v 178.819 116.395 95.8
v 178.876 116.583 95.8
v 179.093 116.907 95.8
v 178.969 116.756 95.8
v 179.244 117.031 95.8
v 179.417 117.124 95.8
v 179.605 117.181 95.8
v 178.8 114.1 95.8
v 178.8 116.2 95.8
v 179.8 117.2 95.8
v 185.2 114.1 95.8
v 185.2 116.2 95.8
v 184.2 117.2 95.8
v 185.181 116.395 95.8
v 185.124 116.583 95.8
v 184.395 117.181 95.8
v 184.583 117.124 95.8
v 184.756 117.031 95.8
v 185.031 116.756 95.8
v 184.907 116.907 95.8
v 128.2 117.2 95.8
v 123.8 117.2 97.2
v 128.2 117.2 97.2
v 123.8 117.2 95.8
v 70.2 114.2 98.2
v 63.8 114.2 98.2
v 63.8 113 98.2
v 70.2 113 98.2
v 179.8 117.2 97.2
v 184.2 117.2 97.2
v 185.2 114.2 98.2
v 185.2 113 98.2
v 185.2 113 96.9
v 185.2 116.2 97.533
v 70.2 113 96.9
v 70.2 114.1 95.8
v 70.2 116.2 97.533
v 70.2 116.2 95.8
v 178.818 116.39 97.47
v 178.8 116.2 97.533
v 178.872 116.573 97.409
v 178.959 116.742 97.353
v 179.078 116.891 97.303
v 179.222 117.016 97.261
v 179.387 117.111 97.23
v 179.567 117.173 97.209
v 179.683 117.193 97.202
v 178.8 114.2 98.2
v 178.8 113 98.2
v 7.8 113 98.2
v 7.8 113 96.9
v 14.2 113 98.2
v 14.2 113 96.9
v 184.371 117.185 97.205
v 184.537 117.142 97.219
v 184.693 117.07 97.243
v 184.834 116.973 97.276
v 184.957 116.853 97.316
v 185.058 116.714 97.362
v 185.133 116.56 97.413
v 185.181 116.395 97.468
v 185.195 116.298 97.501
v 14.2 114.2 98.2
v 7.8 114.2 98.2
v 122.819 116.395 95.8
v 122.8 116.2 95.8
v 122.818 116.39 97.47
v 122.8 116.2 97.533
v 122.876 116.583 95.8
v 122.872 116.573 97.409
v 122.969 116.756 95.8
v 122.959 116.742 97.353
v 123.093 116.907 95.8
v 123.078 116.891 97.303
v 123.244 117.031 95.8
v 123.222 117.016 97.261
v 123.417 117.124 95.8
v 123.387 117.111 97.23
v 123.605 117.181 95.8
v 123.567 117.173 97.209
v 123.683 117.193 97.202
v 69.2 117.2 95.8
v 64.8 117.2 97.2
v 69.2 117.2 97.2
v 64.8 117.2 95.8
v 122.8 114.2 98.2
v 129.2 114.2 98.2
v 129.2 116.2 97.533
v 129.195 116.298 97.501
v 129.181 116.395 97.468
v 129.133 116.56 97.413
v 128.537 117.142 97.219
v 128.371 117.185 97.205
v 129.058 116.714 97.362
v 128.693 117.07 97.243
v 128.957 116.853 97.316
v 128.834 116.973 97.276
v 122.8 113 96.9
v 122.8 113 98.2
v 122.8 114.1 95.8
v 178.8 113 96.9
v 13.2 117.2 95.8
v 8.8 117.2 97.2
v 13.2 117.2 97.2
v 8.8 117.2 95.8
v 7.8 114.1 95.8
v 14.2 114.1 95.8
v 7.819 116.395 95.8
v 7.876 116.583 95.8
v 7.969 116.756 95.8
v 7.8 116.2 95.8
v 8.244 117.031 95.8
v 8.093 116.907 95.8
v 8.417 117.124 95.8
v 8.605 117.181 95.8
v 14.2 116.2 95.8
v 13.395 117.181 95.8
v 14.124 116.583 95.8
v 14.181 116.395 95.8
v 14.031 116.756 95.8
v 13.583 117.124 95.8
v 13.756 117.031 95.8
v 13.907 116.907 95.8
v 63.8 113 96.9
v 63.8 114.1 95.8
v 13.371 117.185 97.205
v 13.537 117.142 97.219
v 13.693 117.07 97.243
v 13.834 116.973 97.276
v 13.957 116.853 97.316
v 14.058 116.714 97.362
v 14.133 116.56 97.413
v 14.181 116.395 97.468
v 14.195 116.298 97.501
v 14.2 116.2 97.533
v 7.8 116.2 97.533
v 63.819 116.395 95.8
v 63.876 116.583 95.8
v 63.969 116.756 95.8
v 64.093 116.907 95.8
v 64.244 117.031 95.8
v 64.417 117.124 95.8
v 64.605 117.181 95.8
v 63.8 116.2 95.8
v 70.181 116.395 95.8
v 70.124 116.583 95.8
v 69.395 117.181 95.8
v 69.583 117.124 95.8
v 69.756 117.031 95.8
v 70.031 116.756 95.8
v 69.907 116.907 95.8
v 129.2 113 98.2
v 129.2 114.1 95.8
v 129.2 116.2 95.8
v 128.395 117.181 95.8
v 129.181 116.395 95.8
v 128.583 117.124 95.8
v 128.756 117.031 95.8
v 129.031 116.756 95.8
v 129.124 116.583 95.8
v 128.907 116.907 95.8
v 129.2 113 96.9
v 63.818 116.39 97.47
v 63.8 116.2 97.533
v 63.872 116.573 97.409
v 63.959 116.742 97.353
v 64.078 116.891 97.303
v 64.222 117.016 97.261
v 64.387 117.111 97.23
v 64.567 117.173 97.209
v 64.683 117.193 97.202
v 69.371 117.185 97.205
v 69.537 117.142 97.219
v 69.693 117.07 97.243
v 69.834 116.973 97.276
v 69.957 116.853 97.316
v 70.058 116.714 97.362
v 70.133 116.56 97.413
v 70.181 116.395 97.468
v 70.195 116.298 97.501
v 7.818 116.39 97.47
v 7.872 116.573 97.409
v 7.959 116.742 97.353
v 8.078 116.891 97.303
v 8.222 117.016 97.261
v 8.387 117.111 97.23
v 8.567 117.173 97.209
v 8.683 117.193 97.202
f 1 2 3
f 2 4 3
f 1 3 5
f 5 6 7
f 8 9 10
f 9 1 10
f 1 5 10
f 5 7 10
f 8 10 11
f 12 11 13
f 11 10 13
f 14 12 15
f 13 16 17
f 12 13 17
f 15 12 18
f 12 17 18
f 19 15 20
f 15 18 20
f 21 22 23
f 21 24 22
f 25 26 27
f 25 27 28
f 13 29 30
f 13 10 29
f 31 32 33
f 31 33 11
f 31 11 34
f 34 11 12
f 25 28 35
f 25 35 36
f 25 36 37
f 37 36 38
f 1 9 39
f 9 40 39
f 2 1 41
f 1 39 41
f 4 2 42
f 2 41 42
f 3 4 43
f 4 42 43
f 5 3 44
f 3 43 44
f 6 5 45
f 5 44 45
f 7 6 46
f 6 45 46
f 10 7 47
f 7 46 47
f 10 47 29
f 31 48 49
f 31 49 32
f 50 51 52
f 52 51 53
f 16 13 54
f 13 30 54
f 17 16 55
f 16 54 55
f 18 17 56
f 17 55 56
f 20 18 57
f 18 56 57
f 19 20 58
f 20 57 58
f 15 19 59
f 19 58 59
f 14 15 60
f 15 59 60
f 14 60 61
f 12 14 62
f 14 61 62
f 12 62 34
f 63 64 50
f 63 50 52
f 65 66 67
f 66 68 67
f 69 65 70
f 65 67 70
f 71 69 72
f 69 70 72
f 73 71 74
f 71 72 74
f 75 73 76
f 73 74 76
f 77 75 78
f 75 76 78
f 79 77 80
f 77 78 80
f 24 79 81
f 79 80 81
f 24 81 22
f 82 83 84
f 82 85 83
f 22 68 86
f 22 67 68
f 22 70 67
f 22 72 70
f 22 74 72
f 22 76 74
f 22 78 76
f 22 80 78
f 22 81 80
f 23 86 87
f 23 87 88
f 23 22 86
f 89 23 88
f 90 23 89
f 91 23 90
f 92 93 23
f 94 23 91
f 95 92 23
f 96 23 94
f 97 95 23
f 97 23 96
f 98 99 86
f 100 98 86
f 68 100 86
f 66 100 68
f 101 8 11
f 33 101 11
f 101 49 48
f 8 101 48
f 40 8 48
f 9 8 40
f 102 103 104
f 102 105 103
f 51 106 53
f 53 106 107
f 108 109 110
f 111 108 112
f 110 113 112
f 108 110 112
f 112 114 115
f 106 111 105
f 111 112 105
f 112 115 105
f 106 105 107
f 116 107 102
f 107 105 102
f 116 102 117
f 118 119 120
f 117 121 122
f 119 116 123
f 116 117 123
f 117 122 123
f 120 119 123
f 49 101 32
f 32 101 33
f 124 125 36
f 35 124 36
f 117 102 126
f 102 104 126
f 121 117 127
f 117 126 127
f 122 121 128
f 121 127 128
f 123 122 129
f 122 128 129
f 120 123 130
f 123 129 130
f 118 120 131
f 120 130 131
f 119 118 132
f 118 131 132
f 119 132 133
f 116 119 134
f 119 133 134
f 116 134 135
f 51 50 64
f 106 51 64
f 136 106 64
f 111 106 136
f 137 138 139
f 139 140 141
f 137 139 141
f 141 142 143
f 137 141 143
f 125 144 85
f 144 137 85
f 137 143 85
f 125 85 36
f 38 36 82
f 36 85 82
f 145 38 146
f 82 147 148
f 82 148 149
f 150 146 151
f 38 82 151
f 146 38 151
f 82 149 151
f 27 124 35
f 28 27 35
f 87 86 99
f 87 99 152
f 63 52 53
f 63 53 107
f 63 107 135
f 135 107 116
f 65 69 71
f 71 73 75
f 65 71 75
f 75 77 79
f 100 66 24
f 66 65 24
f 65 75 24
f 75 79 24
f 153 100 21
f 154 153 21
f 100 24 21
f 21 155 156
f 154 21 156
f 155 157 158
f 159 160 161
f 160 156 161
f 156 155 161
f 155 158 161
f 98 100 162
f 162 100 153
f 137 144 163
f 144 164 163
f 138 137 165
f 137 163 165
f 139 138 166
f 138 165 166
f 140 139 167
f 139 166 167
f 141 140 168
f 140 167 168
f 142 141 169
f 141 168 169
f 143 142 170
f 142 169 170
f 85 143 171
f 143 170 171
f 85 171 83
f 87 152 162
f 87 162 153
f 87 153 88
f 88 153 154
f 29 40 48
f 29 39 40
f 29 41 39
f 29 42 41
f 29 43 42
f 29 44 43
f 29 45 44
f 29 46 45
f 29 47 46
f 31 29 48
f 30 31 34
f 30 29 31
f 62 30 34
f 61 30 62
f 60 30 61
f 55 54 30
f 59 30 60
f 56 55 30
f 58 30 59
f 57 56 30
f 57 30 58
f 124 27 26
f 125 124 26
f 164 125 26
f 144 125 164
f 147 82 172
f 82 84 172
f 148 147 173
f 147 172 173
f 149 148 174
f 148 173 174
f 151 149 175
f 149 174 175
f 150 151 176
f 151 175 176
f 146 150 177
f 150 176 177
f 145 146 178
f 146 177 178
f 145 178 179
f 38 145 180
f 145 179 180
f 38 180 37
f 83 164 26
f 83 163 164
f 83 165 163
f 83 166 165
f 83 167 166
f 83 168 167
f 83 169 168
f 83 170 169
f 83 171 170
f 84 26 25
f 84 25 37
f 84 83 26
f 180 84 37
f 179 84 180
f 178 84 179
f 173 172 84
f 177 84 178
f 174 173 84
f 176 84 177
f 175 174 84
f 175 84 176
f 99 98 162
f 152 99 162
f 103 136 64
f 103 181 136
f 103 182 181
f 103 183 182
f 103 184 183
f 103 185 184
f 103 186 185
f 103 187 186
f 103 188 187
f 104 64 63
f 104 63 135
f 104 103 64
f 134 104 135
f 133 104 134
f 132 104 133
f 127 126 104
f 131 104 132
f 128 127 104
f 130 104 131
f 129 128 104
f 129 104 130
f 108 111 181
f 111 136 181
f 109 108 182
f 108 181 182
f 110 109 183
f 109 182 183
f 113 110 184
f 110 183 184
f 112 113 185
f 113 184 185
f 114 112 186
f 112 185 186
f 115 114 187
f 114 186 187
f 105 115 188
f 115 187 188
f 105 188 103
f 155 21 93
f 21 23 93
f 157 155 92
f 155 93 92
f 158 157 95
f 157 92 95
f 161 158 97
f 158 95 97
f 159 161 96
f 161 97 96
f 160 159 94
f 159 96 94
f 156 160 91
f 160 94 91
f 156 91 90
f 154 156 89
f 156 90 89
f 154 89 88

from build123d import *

# Parameters (mm, degrees)
BOX085192_W                  = 6.4
BOX085192_H                  = 4.2
BOX085192_DEPTH              = 2.4
CHAMFER011006003017079_SIZE  = 1.1
CHAMFER011006003017078_SIZE2 = 1
CHAMFER011006003017078_SIZE  = 3
BOX085193_W                  = 6.4
BOX085193_H                  = 4.2
BOX085193_DEPTH              = 2.4
CHAMFER011006003017081_SIZE  = 1.1
CHAMFER011006003017080_SIZE2 = 1
CHAMFER011006003017080_SIZE  = 3
BOX085194_W                  = 6.4
BOX085194_H                  = 4.2
BOX085194_DEPTH              = 2.4
CHAMFER011006003017083_SIZE  = 1.1
CHAMFER011006003017082_SIZE2 = 1
CHAMFER011006003017082_SIZE  = 3
BOX085191_W                  = 6.4
BOX085191_H                  = 4.2
BOX085191_DEPTH              = 2.4
CHAMFER011006003017076_SIZE  = 1.1
CHAMFER011006003017077_SIZE2 = 1
CHAMFER011006003017077_SIZE  = 3
FILLET005011017082052_R      = 1


with BuildPart() as chamfer011006003017078:
    # Box085192 → Box085192 (new body)
    with BuildSketch(Plane(origin=(63.8, 113, 95.8), x_dir=(1, 0, 0), z_dir=(0, 0, 1))):
        with Locations((3.2, 2.1)):
            Rectangle(BOX085192_W, BOX085192_H)
    extrude(amount=BOX085192_DEPTH)

    # Chamfer011006003017079
    chamfer011006003017079_edges = [chamfer011006003017078.edges().sort_by_distance(p)[0] for p in [
        (67, 113, 95.8),
    ]]
    chamfer(chamfer011006003017079_edges, length=CHAMFER011006003017079_SIZE)

    # Chamfer011006003017078
    chamfer011006003017078_edges = [chamfer011006003017078.edges().sort_by_distance(p)[0] for p in [
        (67, 117.2, 98.2),
    ]]
    chamfer011006003017078_side = chamfer011006003017078.faces().sort_by_distance((67, 115.1, 98.2))[0]
    chamfer(chamfer011006003017078_edges, length=CHAMFER011006003017078_SIZE, length2=CHAMFER011006003017078_SIZE2, reference=chamfer011006003017078_side)


with BuildPart() as chamfer011006003017080:
    # Box085193 → Box085193 (new body)
    with BuildSketch(Plane(origin=(122.8, 113, 95.8), x_dir=(1, 0, 0), z_dir=(0, 0, 1))):
        with Locations((3.2, 2.1)):
            Rectangle(BOX085193_W, BOX085193_H)
    extrude(amount=BOX085193_DEPTH)

    # Chamfer011006003017081
    chamfer011006003017081_edges = [chamfer011006003017080.edges().sort_by_distance(p)[0] for p in [
        (126, 113, 95.8),
    ]]
    chamfer(chamfer011006003017081_edges, length=CHAMFER011006003017081_SIZE)

    # Chamfer011006003017080
    chamfer011006003017080_edges = [chamfer011006003017080.edges().sort_by_distance(p)[0] for p in [
        (126, 117.2, 98.2),
    ]]
    chamfer011006003017080_side = chamfer011006003017080.faces().sort_by_distance((126, 115.1, 98.2))[0]
    chamfer(chamfer011006003017080_edges, length=CHAMFER011006003017080_SIZE, length2=CHAMFER011006003017080_SIZE2, reference=chamfer011006003017080_side)


with BuildPart() as chamfer011006003017082:
    # Box085194 → Box085194 (new body)
    with BuildSketch(Plane(origin=(178.8, 113, 95.8), x_dir=(1, 0, 0), z_dir=(0, 0, 1))):
        with Locations((3.2, 2.1)):
            Rectangle(BOX085194_W, BOX085194_H)
    extrude(amount=BOX085194_DEPTH)

    # Chamfer011006003017083
    chamfer011006003017083_edges = [chamfer011006003017082.edges().sort_by_distance(p)[0] for p in [
        (182, 113, 95.8),
    ]]
    chamfer(chamfer011006003017083_edges, length=CHAMFER011006003017083_SIZE)

    # Chamfer011006003017082
    chamfer011006003017082_edges = [chamfer011006003017082.edges().sort_by_distance(p)[0] for p in [
        (182, 117.2, 98.2),
    ]]
    chamfer011006003017082_side = chamfer011006003017082.faces().sort_by_distance((182, 115.1, 98.2))[0]
    chamfer(chamfer011006003017082_edges, length=CHAMFER011006003017082_SIZE, length2=CHAMFER011006003017082_SIZE2, reference=chamfer011006003017082_side)


with BuildPart() as top_tab_holes:
    # Box085191 → Box085191 (new body)
    with BuildSketch(Plane(origin=(7.8, 113, 95.8), x_dir=(1, 0, 0), z_dir=(0, 0, 1))):
        with Locations((3.2, 2.1)):
            Rectangle(BOX085191_W, BOX085191_H)
    extrude(amount=BOX085191_DEPTH)

    # Chamfer011006003017076
    chamfer011006003017076_edges = [top_tab_holes.edges().sort_by_distance(p)[0] for p in [
        (11, 113, 95.8),
    ]]
    chamfer(chamfer011006003017076_edges, length=CHAMFER011006003017076_SIZE)

    # Chamfer011006003017077
    chamfer011006003017077_edges = [top_tab_holes.edges().sort_by_distance(p)[0] for p in [
        (11, 117.2, 98.2),
    ]]
    chamfer011006003017077_side = top_tab_holes.faces().sort_by_distance((11, 115.1, 98.2))[0]
    chamfer(chamfer011006003017077_edges, length=CHAMFER011006003017077_SIZE, length2=CHAMFER011006003017077_SIZE2, reference=chamfer011006003017077_side)

    # Fusion004008002002002001007002002026012041: union Chamfer011006003017078, Chamfer011006003017080, Chamfer011006003017082
    add(chamfer011006003017078.part)
    add(chamfer011006003017080.part)
    add(chamfer011006003017082.part)

    # Fillet005011017082052
    fillet005011017082052_edges = [top_tab_holes.edges().sort_by_distance(p)[0] for p in [
        (7.8, 117.2, 96.5),
        (14.2, 117.2, 96.5),
        (63.8, 117.2, 96.5),
        (70.2, 117.2, 96.5),
        (122.8, 117.2, 96.5),
        (129.2, 117.2, 96.5),
        (178.8, 117.2, 96.5),
        (185.2, 117.2, 96.5),
    ]]
    fillet(fillet005011017082052_edges, radius=FILLET005011017082052_R)


solid = top_tab_holes.part
